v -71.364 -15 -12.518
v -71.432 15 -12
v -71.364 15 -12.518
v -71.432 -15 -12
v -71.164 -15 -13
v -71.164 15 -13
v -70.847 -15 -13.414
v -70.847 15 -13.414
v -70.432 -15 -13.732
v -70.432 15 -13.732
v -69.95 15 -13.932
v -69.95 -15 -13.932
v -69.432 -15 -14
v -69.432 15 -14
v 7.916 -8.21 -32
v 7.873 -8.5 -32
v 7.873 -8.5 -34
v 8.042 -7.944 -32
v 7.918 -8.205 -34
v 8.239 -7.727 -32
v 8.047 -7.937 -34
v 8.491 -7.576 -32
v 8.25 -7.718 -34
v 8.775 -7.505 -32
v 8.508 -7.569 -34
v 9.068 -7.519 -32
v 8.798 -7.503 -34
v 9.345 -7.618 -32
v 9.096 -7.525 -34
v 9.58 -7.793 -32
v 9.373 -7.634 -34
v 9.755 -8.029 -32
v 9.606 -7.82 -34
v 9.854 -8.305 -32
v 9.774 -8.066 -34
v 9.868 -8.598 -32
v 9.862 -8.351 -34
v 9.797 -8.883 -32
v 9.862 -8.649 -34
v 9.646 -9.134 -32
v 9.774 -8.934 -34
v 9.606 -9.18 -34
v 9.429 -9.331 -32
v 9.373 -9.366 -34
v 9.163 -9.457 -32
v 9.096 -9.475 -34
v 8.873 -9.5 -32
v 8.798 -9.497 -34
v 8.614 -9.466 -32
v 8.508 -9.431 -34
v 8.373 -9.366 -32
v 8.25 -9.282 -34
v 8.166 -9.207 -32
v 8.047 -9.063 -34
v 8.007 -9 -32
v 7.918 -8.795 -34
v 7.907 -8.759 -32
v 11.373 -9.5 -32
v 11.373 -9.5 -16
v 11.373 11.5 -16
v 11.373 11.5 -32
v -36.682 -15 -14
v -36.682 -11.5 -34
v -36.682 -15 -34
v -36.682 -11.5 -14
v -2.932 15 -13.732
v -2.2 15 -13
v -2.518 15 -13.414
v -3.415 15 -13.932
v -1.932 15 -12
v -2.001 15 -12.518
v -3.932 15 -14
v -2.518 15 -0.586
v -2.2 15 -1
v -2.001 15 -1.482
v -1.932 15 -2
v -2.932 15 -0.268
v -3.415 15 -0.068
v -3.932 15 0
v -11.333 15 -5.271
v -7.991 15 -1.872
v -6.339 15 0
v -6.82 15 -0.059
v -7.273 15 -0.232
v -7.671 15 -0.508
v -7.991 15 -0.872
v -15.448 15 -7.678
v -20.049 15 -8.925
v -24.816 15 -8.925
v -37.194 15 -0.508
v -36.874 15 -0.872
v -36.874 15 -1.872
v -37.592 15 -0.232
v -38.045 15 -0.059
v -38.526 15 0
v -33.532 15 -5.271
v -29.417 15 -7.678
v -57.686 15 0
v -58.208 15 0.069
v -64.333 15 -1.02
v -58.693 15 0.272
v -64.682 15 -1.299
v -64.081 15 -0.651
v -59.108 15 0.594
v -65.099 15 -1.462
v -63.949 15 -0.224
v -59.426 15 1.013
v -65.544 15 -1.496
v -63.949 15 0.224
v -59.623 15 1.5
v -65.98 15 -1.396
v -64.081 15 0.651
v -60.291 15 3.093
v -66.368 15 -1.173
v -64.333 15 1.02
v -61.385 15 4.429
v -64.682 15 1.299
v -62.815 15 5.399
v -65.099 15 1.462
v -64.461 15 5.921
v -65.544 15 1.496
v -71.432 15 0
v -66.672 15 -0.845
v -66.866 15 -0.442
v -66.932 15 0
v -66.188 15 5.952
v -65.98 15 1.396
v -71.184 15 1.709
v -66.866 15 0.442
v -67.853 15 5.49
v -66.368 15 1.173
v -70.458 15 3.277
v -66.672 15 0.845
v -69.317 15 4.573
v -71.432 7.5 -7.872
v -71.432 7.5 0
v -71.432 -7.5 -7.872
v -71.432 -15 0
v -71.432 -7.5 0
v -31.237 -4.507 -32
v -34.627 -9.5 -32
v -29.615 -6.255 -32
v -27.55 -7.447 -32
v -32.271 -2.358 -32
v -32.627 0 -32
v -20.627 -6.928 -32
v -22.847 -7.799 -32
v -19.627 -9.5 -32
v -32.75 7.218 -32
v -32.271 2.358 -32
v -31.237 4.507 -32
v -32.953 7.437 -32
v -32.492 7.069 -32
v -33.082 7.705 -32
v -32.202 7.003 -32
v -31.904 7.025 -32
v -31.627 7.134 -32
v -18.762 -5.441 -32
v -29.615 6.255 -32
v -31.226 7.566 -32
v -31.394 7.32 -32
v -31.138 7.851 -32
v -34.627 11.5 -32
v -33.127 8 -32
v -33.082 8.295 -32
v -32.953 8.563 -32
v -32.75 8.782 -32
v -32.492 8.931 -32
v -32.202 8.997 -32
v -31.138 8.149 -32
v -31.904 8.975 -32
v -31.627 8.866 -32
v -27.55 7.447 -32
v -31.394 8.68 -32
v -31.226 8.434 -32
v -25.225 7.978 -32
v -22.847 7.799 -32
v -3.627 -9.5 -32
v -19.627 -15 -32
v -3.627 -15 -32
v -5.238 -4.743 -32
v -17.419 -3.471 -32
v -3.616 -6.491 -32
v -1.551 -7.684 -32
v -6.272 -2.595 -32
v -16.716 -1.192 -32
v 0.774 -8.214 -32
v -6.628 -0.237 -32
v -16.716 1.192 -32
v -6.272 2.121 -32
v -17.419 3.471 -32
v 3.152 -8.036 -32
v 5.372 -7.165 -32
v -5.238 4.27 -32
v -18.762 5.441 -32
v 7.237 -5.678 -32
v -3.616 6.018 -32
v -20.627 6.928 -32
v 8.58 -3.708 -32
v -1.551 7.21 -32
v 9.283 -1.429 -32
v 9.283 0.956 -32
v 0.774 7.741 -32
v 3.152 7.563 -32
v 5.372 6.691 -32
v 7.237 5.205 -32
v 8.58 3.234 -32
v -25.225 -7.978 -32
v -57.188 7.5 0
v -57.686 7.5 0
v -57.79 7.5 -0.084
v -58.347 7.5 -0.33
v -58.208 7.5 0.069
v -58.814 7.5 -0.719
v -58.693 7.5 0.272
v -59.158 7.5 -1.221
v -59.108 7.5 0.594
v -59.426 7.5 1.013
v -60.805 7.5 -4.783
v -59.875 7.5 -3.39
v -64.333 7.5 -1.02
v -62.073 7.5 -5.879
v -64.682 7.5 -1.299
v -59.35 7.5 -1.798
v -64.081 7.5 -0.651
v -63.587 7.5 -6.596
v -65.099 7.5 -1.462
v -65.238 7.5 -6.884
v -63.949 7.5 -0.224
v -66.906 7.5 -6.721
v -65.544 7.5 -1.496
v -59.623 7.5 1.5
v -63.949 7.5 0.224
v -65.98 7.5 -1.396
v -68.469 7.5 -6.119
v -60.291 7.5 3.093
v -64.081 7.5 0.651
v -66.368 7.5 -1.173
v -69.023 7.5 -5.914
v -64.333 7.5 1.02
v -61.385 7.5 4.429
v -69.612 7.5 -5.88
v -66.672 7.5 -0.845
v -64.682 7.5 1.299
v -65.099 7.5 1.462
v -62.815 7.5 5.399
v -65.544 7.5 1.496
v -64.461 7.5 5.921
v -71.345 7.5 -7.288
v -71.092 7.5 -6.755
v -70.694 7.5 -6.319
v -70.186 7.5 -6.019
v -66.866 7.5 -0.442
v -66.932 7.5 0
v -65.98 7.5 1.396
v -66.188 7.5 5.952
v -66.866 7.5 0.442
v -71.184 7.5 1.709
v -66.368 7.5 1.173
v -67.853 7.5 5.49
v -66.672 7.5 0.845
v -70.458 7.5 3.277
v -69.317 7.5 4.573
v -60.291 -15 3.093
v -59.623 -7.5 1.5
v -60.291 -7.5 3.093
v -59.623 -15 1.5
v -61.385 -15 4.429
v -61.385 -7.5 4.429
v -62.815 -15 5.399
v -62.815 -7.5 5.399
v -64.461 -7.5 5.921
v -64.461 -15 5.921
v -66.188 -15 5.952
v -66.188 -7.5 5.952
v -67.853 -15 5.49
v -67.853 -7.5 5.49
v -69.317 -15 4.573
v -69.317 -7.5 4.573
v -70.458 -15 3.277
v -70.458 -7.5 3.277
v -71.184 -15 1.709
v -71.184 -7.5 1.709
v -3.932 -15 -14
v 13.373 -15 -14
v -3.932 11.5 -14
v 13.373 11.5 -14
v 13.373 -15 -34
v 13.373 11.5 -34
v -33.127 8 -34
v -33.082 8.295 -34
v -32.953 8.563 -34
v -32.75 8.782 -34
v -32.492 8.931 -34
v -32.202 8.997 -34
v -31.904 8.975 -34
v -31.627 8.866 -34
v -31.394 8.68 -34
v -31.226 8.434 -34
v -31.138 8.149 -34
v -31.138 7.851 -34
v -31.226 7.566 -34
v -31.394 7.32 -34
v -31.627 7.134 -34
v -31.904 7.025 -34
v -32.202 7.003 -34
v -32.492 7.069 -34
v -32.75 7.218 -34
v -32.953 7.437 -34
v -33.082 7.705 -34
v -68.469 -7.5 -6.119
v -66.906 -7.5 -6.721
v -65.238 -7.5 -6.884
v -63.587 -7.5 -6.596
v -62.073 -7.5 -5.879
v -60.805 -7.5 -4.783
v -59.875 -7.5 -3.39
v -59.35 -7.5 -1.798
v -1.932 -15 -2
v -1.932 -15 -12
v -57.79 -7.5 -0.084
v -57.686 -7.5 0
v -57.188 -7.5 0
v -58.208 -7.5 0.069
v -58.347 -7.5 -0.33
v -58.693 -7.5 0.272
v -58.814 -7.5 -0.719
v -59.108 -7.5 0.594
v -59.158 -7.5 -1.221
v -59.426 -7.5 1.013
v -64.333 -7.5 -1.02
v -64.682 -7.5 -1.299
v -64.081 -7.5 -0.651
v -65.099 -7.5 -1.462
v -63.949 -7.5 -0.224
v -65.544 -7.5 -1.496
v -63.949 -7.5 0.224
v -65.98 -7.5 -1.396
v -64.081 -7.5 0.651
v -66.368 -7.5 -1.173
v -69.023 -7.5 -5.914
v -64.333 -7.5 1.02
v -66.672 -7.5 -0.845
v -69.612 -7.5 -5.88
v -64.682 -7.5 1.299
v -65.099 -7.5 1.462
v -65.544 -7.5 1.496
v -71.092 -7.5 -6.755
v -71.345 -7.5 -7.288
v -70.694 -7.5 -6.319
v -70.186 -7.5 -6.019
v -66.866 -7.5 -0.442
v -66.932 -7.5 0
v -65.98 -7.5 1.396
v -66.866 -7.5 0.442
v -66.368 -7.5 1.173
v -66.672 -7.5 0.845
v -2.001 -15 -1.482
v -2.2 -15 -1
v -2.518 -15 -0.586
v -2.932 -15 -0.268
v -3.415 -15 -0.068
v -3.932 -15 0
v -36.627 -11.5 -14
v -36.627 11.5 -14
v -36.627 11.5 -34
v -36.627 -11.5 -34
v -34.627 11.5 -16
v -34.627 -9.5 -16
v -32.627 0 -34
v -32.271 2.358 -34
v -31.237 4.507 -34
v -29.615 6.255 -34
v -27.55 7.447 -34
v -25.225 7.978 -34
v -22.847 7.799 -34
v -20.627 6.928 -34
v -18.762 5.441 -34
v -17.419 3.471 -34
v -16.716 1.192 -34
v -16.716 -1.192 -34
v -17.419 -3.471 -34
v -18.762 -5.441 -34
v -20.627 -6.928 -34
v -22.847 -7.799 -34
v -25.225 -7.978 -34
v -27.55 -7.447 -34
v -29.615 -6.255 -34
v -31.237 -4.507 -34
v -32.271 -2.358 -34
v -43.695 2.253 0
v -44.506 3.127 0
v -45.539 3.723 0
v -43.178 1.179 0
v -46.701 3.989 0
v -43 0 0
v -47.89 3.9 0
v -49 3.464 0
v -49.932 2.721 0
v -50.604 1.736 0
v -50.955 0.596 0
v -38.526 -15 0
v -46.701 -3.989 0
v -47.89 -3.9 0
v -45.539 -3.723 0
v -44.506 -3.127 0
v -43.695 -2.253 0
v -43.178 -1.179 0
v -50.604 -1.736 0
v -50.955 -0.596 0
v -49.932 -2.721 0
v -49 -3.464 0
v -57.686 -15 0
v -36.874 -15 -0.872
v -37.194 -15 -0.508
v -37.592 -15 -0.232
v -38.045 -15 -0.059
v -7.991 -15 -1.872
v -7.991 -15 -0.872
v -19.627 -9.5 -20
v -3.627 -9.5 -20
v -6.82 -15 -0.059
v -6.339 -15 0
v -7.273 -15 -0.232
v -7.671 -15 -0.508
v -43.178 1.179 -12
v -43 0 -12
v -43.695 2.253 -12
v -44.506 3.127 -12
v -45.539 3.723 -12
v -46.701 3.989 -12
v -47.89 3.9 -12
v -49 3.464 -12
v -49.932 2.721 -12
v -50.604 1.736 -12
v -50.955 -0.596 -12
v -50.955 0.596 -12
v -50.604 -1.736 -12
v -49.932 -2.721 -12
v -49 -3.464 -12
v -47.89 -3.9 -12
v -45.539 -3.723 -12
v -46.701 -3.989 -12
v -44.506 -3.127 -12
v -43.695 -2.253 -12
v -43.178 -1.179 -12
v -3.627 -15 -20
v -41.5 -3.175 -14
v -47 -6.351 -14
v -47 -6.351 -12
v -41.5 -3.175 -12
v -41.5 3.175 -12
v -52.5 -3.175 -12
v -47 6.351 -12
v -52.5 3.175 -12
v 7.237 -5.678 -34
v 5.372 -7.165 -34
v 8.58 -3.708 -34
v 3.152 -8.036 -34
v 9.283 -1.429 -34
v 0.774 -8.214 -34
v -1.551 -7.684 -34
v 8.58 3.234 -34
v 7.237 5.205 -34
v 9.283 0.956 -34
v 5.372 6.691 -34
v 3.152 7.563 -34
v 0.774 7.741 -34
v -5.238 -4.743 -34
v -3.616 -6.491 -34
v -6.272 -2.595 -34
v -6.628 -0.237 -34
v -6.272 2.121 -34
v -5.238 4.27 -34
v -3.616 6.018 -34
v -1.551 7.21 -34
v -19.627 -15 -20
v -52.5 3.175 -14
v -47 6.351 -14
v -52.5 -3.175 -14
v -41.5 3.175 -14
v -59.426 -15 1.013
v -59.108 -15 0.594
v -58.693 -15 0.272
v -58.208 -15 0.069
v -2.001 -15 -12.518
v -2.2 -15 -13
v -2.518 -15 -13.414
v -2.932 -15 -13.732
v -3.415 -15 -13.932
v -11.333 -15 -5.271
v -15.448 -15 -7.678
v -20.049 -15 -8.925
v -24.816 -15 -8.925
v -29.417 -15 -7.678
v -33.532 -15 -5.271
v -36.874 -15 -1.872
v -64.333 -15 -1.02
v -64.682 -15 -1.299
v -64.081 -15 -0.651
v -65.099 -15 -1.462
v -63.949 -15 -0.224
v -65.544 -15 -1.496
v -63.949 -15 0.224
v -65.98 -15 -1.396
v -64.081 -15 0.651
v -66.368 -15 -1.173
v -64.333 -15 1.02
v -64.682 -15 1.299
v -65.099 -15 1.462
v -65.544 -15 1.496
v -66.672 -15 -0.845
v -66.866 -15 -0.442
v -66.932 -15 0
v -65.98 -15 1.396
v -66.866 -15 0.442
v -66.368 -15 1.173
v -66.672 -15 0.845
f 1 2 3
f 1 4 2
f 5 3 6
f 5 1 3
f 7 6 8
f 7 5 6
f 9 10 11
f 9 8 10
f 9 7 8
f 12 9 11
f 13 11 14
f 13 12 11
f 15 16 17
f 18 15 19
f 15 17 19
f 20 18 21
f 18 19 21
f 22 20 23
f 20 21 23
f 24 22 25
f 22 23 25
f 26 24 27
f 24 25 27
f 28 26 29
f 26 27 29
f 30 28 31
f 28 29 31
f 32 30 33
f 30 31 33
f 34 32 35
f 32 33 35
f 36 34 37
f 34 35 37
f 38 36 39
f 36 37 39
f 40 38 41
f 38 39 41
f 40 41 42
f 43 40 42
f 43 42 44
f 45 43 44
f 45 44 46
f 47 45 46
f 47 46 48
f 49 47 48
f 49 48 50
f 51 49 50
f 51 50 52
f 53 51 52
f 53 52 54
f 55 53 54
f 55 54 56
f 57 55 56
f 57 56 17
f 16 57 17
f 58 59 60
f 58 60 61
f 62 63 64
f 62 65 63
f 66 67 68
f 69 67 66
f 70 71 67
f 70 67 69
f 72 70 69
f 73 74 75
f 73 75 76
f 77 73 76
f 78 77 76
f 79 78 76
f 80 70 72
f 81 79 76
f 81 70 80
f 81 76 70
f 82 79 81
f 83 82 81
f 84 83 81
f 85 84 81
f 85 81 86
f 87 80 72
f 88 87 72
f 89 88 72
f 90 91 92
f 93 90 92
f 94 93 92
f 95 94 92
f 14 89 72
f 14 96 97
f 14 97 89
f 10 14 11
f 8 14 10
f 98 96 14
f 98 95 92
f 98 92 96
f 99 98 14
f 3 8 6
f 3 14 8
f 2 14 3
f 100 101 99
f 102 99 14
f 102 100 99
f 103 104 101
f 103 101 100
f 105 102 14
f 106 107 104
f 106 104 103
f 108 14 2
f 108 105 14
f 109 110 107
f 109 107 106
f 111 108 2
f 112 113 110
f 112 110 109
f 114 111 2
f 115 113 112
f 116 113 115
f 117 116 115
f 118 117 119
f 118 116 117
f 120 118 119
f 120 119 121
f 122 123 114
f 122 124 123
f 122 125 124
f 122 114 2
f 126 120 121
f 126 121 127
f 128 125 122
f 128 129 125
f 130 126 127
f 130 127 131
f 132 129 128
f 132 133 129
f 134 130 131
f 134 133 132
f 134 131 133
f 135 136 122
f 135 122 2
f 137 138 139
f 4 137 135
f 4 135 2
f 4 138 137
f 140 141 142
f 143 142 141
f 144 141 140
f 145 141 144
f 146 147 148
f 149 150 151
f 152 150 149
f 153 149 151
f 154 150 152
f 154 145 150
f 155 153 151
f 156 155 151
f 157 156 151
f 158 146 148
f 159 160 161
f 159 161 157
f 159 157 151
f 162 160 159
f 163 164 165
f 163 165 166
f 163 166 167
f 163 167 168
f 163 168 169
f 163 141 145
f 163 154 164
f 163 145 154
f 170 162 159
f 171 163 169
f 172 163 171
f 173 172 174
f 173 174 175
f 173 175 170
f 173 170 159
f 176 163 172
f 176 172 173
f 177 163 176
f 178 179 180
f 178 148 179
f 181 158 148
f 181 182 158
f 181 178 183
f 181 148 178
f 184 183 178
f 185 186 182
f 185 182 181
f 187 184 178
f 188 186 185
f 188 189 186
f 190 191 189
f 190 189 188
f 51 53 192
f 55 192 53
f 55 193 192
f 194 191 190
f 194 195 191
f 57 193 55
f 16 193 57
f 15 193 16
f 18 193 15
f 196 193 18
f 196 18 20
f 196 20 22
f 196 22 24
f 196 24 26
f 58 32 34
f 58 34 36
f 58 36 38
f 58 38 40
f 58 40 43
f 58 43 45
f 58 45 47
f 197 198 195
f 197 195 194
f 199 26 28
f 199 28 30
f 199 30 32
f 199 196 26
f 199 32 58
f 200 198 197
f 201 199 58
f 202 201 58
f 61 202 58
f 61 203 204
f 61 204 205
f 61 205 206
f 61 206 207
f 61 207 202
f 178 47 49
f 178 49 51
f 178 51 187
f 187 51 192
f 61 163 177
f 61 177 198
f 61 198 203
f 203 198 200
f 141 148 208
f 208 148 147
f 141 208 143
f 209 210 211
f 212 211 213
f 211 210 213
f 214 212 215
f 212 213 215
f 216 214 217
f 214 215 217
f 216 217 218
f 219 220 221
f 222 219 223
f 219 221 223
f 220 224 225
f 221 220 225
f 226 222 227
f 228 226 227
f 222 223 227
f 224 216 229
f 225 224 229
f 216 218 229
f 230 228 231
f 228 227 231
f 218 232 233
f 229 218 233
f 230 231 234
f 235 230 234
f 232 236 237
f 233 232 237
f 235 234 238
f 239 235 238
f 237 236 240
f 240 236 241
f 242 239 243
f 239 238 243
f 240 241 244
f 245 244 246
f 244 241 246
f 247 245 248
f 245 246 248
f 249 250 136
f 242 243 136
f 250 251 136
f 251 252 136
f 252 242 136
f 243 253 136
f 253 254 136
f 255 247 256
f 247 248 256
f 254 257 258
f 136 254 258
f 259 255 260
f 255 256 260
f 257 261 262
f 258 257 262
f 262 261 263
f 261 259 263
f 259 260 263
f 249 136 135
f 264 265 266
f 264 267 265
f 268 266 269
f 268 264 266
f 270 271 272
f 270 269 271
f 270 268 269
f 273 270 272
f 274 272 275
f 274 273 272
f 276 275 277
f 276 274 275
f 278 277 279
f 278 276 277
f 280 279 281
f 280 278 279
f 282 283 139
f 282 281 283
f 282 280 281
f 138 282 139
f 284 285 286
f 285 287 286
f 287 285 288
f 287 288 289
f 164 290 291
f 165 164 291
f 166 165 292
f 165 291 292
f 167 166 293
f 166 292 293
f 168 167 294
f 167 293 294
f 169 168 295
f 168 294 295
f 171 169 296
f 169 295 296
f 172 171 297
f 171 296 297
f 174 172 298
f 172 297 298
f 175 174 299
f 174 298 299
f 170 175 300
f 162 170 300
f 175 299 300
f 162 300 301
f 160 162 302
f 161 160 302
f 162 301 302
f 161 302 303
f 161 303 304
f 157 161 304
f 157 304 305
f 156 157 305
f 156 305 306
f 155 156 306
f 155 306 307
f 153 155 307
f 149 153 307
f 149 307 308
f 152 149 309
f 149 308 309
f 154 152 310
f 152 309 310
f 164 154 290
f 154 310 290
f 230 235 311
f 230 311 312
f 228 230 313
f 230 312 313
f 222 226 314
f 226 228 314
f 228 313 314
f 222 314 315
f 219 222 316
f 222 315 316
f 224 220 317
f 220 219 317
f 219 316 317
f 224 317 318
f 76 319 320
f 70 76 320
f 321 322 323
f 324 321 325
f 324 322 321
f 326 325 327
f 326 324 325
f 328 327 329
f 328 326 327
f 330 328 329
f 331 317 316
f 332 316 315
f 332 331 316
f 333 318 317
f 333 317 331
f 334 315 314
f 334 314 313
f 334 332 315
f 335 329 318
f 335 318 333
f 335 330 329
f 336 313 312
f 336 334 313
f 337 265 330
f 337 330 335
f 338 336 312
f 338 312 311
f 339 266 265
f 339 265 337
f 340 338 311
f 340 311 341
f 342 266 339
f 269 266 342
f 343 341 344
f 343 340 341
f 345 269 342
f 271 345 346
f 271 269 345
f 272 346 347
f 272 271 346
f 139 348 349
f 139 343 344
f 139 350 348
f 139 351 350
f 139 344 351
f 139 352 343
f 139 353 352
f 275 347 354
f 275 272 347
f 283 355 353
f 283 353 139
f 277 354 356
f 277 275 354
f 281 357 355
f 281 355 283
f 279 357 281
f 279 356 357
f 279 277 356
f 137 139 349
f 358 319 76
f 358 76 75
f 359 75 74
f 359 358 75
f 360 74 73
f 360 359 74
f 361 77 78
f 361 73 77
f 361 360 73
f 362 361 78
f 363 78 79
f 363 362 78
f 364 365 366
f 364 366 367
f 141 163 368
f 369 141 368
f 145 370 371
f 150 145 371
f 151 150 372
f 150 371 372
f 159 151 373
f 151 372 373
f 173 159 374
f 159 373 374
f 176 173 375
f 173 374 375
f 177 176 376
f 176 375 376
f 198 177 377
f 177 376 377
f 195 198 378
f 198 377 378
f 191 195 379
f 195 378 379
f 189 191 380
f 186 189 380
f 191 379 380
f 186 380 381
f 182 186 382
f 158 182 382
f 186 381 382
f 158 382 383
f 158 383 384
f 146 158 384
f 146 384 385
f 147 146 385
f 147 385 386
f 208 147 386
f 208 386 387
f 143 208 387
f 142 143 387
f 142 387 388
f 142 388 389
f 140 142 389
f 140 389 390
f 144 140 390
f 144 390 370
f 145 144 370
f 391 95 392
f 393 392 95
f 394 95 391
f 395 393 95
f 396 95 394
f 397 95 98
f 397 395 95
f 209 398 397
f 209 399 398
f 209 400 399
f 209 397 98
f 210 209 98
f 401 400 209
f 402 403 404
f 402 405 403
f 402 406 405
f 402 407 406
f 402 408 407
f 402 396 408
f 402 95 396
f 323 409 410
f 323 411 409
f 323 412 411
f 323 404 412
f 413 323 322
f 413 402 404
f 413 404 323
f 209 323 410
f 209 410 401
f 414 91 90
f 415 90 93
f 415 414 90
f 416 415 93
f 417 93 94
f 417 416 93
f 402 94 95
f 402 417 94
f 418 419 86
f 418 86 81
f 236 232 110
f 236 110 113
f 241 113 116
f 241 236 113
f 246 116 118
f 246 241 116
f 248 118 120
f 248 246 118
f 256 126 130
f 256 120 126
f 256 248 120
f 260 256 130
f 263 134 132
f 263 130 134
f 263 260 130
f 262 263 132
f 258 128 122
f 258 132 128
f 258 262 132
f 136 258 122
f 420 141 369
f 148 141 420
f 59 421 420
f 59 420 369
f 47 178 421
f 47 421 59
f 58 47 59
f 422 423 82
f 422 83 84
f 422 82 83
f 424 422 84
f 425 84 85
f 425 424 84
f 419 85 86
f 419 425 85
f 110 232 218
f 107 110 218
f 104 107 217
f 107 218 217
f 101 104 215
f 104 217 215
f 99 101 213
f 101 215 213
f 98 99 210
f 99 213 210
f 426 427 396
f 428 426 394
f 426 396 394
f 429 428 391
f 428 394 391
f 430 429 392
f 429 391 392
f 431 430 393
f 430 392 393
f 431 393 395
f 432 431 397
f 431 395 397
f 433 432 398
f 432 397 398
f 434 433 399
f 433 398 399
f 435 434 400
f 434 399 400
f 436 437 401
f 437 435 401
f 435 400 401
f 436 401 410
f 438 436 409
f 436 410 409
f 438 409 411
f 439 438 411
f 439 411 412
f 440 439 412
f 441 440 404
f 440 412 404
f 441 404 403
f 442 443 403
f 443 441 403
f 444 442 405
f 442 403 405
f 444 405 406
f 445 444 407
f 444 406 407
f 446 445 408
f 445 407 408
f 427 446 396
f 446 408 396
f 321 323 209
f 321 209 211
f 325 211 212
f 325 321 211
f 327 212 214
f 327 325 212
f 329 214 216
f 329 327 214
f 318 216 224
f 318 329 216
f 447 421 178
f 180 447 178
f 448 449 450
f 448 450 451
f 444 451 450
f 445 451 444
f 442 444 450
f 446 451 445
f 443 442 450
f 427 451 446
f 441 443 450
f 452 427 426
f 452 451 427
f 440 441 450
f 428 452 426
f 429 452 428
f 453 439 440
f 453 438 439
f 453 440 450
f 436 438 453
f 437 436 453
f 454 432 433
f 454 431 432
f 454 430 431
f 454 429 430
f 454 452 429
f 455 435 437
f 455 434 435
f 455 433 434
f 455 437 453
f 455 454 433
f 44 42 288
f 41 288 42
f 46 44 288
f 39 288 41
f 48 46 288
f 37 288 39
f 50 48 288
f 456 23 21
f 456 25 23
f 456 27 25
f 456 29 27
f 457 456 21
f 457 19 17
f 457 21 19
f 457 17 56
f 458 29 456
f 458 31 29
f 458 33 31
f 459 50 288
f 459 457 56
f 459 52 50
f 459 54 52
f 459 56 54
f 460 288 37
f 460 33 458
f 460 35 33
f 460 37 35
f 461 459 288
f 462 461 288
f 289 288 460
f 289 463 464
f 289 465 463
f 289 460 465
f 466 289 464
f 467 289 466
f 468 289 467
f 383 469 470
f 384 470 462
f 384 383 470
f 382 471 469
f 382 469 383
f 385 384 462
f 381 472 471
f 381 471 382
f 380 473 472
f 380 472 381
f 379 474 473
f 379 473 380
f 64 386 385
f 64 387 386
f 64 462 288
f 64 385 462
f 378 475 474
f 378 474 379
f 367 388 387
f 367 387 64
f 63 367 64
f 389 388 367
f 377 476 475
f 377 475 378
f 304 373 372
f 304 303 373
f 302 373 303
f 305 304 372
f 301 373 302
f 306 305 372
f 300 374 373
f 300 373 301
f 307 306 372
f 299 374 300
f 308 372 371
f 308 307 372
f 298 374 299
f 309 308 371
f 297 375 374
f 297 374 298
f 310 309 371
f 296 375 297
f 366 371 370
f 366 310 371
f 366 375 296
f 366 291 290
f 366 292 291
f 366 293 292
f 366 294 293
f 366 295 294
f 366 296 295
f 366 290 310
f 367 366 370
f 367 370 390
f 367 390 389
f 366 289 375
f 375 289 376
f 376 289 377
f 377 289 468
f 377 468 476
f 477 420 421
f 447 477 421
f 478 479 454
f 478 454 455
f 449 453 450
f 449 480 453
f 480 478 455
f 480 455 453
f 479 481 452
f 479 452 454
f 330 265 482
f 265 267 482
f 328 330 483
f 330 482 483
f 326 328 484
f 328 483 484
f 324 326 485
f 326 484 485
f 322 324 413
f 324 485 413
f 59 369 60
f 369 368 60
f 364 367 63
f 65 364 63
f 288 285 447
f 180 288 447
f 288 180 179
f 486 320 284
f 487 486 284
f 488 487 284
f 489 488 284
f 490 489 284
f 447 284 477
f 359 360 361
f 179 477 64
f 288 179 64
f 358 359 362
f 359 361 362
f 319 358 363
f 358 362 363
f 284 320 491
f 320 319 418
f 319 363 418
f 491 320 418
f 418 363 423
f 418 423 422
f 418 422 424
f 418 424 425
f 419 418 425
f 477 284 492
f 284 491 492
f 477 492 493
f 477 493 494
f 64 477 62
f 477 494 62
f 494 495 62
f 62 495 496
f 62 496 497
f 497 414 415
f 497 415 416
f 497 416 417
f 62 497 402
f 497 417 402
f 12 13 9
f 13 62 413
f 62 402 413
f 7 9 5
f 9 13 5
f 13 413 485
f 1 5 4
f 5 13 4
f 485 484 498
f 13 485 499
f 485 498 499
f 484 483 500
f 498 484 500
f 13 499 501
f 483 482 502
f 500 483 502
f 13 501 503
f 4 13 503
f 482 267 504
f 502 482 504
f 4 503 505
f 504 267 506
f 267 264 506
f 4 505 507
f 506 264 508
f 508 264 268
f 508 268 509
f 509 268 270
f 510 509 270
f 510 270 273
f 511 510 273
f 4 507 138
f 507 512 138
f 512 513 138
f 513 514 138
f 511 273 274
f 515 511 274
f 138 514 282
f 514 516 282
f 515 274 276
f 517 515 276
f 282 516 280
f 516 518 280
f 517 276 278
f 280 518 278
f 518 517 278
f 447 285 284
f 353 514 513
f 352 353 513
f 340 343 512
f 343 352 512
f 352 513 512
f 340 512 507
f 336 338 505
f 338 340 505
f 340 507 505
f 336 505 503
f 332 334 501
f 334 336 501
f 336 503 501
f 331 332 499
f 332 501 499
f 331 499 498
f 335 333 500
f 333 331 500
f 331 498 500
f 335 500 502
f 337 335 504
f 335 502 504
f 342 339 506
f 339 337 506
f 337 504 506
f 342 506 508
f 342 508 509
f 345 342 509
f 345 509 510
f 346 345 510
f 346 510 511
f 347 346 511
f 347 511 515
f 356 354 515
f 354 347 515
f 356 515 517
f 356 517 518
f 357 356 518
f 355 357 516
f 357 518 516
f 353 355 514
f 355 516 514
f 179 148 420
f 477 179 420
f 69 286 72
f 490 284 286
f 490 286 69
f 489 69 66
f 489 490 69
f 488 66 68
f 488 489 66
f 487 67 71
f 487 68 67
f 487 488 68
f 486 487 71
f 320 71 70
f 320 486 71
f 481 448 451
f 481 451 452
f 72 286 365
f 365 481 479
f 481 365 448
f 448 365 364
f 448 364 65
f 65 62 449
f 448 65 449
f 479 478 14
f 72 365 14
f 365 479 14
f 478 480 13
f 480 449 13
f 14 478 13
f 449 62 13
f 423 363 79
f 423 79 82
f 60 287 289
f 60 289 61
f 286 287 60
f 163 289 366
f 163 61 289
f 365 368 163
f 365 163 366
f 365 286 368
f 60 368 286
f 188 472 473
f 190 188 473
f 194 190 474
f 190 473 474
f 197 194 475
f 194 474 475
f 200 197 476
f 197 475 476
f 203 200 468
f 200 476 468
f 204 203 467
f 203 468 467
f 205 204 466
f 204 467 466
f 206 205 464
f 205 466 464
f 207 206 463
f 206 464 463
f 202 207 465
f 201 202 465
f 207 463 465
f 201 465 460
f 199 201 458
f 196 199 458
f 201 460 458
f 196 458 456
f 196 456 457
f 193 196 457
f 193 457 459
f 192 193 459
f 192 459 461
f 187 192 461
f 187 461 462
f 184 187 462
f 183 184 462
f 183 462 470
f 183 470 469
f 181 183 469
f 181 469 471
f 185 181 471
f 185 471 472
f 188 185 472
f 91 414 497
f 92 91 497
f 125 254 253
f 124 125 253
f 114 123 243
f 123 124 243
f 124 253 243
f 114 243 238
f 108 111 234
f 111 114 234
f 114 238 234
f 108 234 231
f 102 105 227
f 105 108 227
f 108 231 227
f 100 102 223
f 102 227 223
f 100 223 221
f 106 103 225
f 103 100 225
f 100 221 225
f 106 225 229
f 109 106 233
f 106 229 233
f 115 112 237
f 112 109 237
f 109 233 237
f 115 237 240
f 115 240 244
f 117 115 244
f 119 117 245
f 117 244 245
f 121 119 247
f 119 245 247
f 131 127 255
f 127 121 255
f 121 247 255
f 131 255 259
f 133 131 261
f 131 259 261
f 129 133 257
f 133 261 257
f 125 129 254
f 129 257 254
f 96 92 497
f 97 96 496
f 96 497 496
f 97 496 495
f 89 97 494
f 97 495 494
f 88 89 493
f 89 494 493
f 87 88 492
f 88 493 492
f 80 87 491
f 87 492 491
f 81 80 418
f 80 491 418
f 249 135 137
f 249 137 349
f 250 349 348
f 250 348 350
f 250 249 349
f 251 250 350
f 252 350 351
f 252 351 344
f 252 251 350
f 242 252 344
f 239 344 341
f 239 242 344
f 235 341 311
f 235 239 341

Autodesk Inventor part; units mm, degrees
ref_plane "YZ Plane" through (0, 0, 0) normal (1, 0, 0) x (0, 1, 0)
ref_plane "XZ Plane" through (0, 0, 0) normal (0, 1, 0) x (-1, 0, 0)
ref_plane "XY Plane" through (0, 0, 0) normal (0, 0, 1) x (1, 0, 0)
sketch "Sketch2" plane through (0, 0, 0) normal (0, 1, 0) x (-1, 0, 0)
  line L0 (3.9324, 0) -> (5, 0)
  arc A0 (3.9324, 0) -> (1.9324, -2) centre (3.9324, -2) ccw
  line L1 (3.9324, 0) -> (6.9065, 0)
  line L2 (3.9324, 0) -> (6.3389, 0)
  arc A1 (7.9907, -0.8725) -> (36.874, -0.8725) centre (22.4324, 8.9853) ccw
  line L3 (38.5258, 0) -> (57.6864, 0)
  arc A2 (71.4324, 0) -> (59.6229, 1.5) centre (65.4324, 0) ccw
  circle A3 centre (65.4324, 0) radius 1.5
  arc A4 (57.6864, 0) -> (59.6229, 1.5) centre (57.6864, 2) ccw
  arc A5 (38.5258, 0) -> (36.874, -0.8725) centre (38.5258, -2) ccw
  arc A6 (7.9907, -0.8725) -> (6.3389, 0) centre (6.3389, -2) ccw
  arc A7 (59.3504, -1.7983) -> (57.1879, 0) centre (57.1879, -2.1995) ccw
  line L4 (77.1831, 8.9853) -> (-10.6505, 8.9853) construction
  line L5 (3.9324, 17.9706) -> (5, 17.9706)
  arc A8 (42.998, 40.9699) -> (1.9324, 19.9706) centre (55.0831, -33.3161) ccw
  arc A9 (1.9324, 19.9706) -> (3.9324, 17.9706) centre (3.9324, 19.9706) ccw
  line L6 (3.9324, 17.9706) -> (6.9065, 17.9706)
  line L7 (3.9324, 17.9706) -> (6.3389, 17.9706)
  arc A10 (36.874, 18.843) -> (7.9907, 18.843) centre (22.4324, 8.9853) ccw
  line L8 (38.5258, 17.9706) -> (57.6864, 17.9706)
  arc A11 (59.6229, 16.4706) -> (71.4324, 17.9706) centre (65.4324, 17.9706) ccw
  arc A12 (71.4324, 17.9706) -> (42.998, 40.9699) centre (43.4479, 12.4496) ccw
  circle A13 centre (65.4324, 17.9706) radius 1.5
  arc A14 (59.6229, 16.4706) -> (57.6864, 17.9706) centre (57.6864, 15.9706) ccw
  arc A15 (36.874, 18.843) -> (38.5258, 17.9706) centre (38.5258, 19.9706) ccw
  arc A16 (6.3389, 17.9706) -> (7.9907, 18.843) centre (6.3389, 19.9706) ccw
  arc A17 (65.6797, 24.421) -> (59.3504, 19.7689) centre (64.5387, 19.3419) ccw
  arc A18 (65.6797, 24.421) -> (67.6049, 27.617) centre (65.5936, 26.6507) ccw
  arc A19 (57.1879, 17.9706) -> (59.3504, 19.7689) centre (57.1879, 20.1701) ccw
  line L9 (1.9324, -2) -> (1.9324, -12)
  line L10 (3.9324, -14) -> (69.4324, -14)
  arc A20 (1.9324, -12) -> (3.9324, -14) centre (3.9324, -12) ccw
  line L11 (71.4324, 0) -> (71.4324, -12)
  arc A21 (69.4324, -14) -> (71.4324, -12) centre (69.4324, -12) ccw
  arc A22 (59.3504, -1.7983) -> (71.4324, -2.4583) centre (65.4715, -0.6626) ccw
  point P0 (0, 0)
  point P1 (7.4324, 0)
  point P2 (37.4324, 0)
  point P3 (22.4324, -8.5)
  point P4 (0, 17.9706)
  point P5 (7.4324, 17.9706)
  point P6 (37.4324, 17.9706)
  point P7 (22.4324, 26.4706)
  point P8 (71.4324, 17.9706)
  point P9 (6.3389, 17.9706)
  dimension "d3" = 2
  dimension "d12" = 3.5
  dimension "d13" = 30
  dimension "d14" = 8.5
  dimension "d17" = 3
  dimension "d18" = 2
  dimension "d19" = 2
  dimension "d21" = 0
  dimension "d22" = 0
  dimension "d91" = 3.9324
  dimension "d92" = 2
  dimension "d93" = 28
  dimension "d94" = 2
  dimension "d107" = 10
extrude "Extrusion1" add sketch "Sketch2" along normal mid plane 30 contours L0 L1 A6 A1 A5 L3 A7 A22 L11 A21 L10 A20 L9 A0 | L3 A4 A2 L11 A22 A7
extrude "Extrusion2" cut sketch "Sketch2" along normal mid plane 15 contours L3 A4 A2 L11 A22 A7
sketch "Sketch7" plane through (0, -15, 0) normal (0, -1, 0) x (1, 0, 0)
  arc A0 (-6.3389, 0) -> (-7.9907, -0.8725) centre (-6.3389, -2) ccw projected
  line L0 (-7.9907, -0.8725) -> (-7.9907, -1.8725)
  arc A1 (-36.874, -0.8725) -> (-7.9907, -0.8725) centre (-22.4324, 8.9853) ccw projected
  line L1 (-36.874, -0.8725) -> (-36.874, -1.8725)
  arc A2 (-36.874, -1.8725) -> (-7.9907, -1.8725) centre (-22.4324, 8.9853) ccw
  point P0 (0, 0)
  dimension "d59" = 1
  dimension "d60" = 1
extrude "Extrusion10" cut sketch "Sketch7" against normal up to next
fillet "Fillet4" radius 2 1 edges at (-71.4324, 0, -2.4583)
sketch "Sketch13" plane through (-57.6864, -15, 0) normal (0, 0, 1) x (1, 0, 0)
  circle A0 centre (10.6864, 15) radius 4
  line L0 (55.754, 30) -> (55.754, 0) projected
  point P0 (57.6864, 15)
  dimension "d99" = 8
  dimension "d106" = 47
extrude "Extrusion15" cut sketch "Sketch13" against normal up to next
sketch "Sketch14" plane through (-3.9324, 15, -14) normal (0, 0, -1) x (-1, 0, 0)
  circle A0 centre (43.0676, -15) radius 4 projected
  line L0 (43.0676, -21.3509) -> (37.5676, -18.1754)
  line L1 (37.5676, -18.1754) -> (37.5676, -11.8246)
  line L2 (37.5676, -11.8246) -> (43.0676, -8.6491)
  line L3 (43.0676, -8.6491) -> (48.5676, -11.8246)
  line L4 (48.5676, -11.8246) -> (48.5676, -18.1754)
  line L5 (48.5676, -18.1754) -> (43.0676, -21.3509)
  line L6 (67.5, -30) -> (67.5, 0) projected
  point P0 (-3.9324, -15)
  point P1 (37.5676, -15)
  dimension "d103" = 11
extrude "Extrusion16" cut sketch "Sketch14" against normal blind 2
sketch "Sketch15" plane through (-3.9324, 15, -14) normal (0, 0, -1) x (-1, 0, 0)
  line L0 (32.6944, -26.5) -> (-17.3056, -26.5)
  line L1 (-17.3056, -26.5) -> (-17.3056, -3.5)
  line L2 (-17.3056, -3.5) -> (32.6944, -3.5)
  line L3 (32.6944, -3.5) -> (32.6944, -26.5)
  line L4 (0, 0) -> (65.5, 0) projected
  line L5 (32.9416, -30) -> (4.0584, -30) projected
  line L6 (-17.3056, -26.5) -> (32.75, -26.5)
  line L7 (32.75, -26.5) -> (32.75, -30)
  line L8 (32.75, -30) -> (-17.3056, -30)
  line L9 (-17.3056, -30) -> (-17.3056, -26.5)
  point P0 (7.6944, -26.5)
  point P1 (4.0584, -30)
  dimension "d111" = 50
  dimension "d112" = 23
extrude "Extrusion17" add sketch "Sketch15" along normal blind 20
sketch "Sketch17" plane through (-3.9324, 15, -34) normal (0, 0, -1) x (-1, 0, 0)
  line L0 (-17.3056, -26.5) -> (32.75, -26.5)
  line L1 (32.75, -30) -> (-17.3056, -30)
  line L2 (32.6944, -26.5) -> (-17.3056, -26.5)
  line L3 (-17.3056, -3.5) -> (32.6944, -3.5)
  circle A0 centre (-12.8056, -23.5) radius 1
  line L4 (-17.3056, -26.5) -> (-17.3056, -3.5)
  line L5 (-17.3056, -30) -> (-17.3056, -26.5)
  circle A1 centre (-5.3045, -15.2368) radius 8
  circle A2 centre (20.6944, -15) radius 8
  line L6 (32.75, -26.5) -> (32.75, -30)
  line L7 (32.9416, -30) -> (4.0584, -30)
  line L8 (32.6944, -3.5) -> (32.6944, -26.5)
  circle A3 centre (28.1944, -7) radius 1
  point P0 (-3.9324, -15)
  point P1 (-3.9324, -15)
  point P2 (7.6944, -26.5)
  point P3 (-3.9324, -15)
  point P4 (0, 0)
  point P5 (7.6944, -13.0925)
  dimension "d142" = 50
  dimension "d143" = 23
  dimension "d144" = 25
  dimension "d145" = 2
  dimension "d146" = 2
  dimension "d147" = 41
  dimension "d148" = 16.5
  dimension "d149" = 3.5
  dimension "d150" = 4.5
  dimension "d151" = 16
  dimension "d152" = 16
  dimension "d153" = 26
  dimension "d154" = 11.5
  dimension "d155" = 13
extrude "Extrusion18" cut sketch "Sketch17" against normal blind 2 contours A0 | A1 | A2 | A3
sketch "Sketch18" plane through (-3.9324, 11.5, -14) normal (0, 1, 0) x (1, 0, 0)
  line L0 (-30.6944, 2) -> (15.3056, 2)
  line L1 (15.3056, 2) -> (15.3056, 18)
  line L2 (15.3056, 18) -> (-30.6944, 18)
  line L3 (-30.6944, 18) -> (-30.6944, 2)
  line L4 (-32.6944, 20) -> (17.3056, 20) projected
  line L5 (0, 0) -> (-65.5, 0) projected
  line L6 (17.3056, 0) -> (17.3056, 20) projected
  line L7 (-32.6944, 0) -> (-32.6944, 20) projected
  point P0 (3.9324, -14)
  dimension "d158" = 2
  dimension "d159" = 2
  dimension "d160" = 2
  dimension "d161" = 2
extrude "Extrusion19" cut sketch "Sketch18" against normal blind 21
sketch "Sketch19" plane through (-3.9324, -9.5, -14) normal (0, 1, 0) x (1, 0, 0)
  line L0 (-30.6944, 18) -> (12.8056, 18) projected
  line L1 (-15.6944, 6) -> (0.3056, 6)
  line L2 (0.3056, 6) -> (0.3056, 18)
  line L3 (0.3056, 18) -> (-15.6944, 18)
  line L4 (-15.6944, 18) -> (-15.6944, 6)
  line L5 (-30.6944, 2) -> (-30.6944, 18) projected
  point P0 (3.9324, -14)
  point P1 (-15.6944, 18)
  dimension "d164" = 15
  dimension "d165" = 16
  dimension "d168" = 12
extrude "Extrusion20" cut sketch "Sketch19" against normal blind 20
properties part number "Bike_Mount_Right"
